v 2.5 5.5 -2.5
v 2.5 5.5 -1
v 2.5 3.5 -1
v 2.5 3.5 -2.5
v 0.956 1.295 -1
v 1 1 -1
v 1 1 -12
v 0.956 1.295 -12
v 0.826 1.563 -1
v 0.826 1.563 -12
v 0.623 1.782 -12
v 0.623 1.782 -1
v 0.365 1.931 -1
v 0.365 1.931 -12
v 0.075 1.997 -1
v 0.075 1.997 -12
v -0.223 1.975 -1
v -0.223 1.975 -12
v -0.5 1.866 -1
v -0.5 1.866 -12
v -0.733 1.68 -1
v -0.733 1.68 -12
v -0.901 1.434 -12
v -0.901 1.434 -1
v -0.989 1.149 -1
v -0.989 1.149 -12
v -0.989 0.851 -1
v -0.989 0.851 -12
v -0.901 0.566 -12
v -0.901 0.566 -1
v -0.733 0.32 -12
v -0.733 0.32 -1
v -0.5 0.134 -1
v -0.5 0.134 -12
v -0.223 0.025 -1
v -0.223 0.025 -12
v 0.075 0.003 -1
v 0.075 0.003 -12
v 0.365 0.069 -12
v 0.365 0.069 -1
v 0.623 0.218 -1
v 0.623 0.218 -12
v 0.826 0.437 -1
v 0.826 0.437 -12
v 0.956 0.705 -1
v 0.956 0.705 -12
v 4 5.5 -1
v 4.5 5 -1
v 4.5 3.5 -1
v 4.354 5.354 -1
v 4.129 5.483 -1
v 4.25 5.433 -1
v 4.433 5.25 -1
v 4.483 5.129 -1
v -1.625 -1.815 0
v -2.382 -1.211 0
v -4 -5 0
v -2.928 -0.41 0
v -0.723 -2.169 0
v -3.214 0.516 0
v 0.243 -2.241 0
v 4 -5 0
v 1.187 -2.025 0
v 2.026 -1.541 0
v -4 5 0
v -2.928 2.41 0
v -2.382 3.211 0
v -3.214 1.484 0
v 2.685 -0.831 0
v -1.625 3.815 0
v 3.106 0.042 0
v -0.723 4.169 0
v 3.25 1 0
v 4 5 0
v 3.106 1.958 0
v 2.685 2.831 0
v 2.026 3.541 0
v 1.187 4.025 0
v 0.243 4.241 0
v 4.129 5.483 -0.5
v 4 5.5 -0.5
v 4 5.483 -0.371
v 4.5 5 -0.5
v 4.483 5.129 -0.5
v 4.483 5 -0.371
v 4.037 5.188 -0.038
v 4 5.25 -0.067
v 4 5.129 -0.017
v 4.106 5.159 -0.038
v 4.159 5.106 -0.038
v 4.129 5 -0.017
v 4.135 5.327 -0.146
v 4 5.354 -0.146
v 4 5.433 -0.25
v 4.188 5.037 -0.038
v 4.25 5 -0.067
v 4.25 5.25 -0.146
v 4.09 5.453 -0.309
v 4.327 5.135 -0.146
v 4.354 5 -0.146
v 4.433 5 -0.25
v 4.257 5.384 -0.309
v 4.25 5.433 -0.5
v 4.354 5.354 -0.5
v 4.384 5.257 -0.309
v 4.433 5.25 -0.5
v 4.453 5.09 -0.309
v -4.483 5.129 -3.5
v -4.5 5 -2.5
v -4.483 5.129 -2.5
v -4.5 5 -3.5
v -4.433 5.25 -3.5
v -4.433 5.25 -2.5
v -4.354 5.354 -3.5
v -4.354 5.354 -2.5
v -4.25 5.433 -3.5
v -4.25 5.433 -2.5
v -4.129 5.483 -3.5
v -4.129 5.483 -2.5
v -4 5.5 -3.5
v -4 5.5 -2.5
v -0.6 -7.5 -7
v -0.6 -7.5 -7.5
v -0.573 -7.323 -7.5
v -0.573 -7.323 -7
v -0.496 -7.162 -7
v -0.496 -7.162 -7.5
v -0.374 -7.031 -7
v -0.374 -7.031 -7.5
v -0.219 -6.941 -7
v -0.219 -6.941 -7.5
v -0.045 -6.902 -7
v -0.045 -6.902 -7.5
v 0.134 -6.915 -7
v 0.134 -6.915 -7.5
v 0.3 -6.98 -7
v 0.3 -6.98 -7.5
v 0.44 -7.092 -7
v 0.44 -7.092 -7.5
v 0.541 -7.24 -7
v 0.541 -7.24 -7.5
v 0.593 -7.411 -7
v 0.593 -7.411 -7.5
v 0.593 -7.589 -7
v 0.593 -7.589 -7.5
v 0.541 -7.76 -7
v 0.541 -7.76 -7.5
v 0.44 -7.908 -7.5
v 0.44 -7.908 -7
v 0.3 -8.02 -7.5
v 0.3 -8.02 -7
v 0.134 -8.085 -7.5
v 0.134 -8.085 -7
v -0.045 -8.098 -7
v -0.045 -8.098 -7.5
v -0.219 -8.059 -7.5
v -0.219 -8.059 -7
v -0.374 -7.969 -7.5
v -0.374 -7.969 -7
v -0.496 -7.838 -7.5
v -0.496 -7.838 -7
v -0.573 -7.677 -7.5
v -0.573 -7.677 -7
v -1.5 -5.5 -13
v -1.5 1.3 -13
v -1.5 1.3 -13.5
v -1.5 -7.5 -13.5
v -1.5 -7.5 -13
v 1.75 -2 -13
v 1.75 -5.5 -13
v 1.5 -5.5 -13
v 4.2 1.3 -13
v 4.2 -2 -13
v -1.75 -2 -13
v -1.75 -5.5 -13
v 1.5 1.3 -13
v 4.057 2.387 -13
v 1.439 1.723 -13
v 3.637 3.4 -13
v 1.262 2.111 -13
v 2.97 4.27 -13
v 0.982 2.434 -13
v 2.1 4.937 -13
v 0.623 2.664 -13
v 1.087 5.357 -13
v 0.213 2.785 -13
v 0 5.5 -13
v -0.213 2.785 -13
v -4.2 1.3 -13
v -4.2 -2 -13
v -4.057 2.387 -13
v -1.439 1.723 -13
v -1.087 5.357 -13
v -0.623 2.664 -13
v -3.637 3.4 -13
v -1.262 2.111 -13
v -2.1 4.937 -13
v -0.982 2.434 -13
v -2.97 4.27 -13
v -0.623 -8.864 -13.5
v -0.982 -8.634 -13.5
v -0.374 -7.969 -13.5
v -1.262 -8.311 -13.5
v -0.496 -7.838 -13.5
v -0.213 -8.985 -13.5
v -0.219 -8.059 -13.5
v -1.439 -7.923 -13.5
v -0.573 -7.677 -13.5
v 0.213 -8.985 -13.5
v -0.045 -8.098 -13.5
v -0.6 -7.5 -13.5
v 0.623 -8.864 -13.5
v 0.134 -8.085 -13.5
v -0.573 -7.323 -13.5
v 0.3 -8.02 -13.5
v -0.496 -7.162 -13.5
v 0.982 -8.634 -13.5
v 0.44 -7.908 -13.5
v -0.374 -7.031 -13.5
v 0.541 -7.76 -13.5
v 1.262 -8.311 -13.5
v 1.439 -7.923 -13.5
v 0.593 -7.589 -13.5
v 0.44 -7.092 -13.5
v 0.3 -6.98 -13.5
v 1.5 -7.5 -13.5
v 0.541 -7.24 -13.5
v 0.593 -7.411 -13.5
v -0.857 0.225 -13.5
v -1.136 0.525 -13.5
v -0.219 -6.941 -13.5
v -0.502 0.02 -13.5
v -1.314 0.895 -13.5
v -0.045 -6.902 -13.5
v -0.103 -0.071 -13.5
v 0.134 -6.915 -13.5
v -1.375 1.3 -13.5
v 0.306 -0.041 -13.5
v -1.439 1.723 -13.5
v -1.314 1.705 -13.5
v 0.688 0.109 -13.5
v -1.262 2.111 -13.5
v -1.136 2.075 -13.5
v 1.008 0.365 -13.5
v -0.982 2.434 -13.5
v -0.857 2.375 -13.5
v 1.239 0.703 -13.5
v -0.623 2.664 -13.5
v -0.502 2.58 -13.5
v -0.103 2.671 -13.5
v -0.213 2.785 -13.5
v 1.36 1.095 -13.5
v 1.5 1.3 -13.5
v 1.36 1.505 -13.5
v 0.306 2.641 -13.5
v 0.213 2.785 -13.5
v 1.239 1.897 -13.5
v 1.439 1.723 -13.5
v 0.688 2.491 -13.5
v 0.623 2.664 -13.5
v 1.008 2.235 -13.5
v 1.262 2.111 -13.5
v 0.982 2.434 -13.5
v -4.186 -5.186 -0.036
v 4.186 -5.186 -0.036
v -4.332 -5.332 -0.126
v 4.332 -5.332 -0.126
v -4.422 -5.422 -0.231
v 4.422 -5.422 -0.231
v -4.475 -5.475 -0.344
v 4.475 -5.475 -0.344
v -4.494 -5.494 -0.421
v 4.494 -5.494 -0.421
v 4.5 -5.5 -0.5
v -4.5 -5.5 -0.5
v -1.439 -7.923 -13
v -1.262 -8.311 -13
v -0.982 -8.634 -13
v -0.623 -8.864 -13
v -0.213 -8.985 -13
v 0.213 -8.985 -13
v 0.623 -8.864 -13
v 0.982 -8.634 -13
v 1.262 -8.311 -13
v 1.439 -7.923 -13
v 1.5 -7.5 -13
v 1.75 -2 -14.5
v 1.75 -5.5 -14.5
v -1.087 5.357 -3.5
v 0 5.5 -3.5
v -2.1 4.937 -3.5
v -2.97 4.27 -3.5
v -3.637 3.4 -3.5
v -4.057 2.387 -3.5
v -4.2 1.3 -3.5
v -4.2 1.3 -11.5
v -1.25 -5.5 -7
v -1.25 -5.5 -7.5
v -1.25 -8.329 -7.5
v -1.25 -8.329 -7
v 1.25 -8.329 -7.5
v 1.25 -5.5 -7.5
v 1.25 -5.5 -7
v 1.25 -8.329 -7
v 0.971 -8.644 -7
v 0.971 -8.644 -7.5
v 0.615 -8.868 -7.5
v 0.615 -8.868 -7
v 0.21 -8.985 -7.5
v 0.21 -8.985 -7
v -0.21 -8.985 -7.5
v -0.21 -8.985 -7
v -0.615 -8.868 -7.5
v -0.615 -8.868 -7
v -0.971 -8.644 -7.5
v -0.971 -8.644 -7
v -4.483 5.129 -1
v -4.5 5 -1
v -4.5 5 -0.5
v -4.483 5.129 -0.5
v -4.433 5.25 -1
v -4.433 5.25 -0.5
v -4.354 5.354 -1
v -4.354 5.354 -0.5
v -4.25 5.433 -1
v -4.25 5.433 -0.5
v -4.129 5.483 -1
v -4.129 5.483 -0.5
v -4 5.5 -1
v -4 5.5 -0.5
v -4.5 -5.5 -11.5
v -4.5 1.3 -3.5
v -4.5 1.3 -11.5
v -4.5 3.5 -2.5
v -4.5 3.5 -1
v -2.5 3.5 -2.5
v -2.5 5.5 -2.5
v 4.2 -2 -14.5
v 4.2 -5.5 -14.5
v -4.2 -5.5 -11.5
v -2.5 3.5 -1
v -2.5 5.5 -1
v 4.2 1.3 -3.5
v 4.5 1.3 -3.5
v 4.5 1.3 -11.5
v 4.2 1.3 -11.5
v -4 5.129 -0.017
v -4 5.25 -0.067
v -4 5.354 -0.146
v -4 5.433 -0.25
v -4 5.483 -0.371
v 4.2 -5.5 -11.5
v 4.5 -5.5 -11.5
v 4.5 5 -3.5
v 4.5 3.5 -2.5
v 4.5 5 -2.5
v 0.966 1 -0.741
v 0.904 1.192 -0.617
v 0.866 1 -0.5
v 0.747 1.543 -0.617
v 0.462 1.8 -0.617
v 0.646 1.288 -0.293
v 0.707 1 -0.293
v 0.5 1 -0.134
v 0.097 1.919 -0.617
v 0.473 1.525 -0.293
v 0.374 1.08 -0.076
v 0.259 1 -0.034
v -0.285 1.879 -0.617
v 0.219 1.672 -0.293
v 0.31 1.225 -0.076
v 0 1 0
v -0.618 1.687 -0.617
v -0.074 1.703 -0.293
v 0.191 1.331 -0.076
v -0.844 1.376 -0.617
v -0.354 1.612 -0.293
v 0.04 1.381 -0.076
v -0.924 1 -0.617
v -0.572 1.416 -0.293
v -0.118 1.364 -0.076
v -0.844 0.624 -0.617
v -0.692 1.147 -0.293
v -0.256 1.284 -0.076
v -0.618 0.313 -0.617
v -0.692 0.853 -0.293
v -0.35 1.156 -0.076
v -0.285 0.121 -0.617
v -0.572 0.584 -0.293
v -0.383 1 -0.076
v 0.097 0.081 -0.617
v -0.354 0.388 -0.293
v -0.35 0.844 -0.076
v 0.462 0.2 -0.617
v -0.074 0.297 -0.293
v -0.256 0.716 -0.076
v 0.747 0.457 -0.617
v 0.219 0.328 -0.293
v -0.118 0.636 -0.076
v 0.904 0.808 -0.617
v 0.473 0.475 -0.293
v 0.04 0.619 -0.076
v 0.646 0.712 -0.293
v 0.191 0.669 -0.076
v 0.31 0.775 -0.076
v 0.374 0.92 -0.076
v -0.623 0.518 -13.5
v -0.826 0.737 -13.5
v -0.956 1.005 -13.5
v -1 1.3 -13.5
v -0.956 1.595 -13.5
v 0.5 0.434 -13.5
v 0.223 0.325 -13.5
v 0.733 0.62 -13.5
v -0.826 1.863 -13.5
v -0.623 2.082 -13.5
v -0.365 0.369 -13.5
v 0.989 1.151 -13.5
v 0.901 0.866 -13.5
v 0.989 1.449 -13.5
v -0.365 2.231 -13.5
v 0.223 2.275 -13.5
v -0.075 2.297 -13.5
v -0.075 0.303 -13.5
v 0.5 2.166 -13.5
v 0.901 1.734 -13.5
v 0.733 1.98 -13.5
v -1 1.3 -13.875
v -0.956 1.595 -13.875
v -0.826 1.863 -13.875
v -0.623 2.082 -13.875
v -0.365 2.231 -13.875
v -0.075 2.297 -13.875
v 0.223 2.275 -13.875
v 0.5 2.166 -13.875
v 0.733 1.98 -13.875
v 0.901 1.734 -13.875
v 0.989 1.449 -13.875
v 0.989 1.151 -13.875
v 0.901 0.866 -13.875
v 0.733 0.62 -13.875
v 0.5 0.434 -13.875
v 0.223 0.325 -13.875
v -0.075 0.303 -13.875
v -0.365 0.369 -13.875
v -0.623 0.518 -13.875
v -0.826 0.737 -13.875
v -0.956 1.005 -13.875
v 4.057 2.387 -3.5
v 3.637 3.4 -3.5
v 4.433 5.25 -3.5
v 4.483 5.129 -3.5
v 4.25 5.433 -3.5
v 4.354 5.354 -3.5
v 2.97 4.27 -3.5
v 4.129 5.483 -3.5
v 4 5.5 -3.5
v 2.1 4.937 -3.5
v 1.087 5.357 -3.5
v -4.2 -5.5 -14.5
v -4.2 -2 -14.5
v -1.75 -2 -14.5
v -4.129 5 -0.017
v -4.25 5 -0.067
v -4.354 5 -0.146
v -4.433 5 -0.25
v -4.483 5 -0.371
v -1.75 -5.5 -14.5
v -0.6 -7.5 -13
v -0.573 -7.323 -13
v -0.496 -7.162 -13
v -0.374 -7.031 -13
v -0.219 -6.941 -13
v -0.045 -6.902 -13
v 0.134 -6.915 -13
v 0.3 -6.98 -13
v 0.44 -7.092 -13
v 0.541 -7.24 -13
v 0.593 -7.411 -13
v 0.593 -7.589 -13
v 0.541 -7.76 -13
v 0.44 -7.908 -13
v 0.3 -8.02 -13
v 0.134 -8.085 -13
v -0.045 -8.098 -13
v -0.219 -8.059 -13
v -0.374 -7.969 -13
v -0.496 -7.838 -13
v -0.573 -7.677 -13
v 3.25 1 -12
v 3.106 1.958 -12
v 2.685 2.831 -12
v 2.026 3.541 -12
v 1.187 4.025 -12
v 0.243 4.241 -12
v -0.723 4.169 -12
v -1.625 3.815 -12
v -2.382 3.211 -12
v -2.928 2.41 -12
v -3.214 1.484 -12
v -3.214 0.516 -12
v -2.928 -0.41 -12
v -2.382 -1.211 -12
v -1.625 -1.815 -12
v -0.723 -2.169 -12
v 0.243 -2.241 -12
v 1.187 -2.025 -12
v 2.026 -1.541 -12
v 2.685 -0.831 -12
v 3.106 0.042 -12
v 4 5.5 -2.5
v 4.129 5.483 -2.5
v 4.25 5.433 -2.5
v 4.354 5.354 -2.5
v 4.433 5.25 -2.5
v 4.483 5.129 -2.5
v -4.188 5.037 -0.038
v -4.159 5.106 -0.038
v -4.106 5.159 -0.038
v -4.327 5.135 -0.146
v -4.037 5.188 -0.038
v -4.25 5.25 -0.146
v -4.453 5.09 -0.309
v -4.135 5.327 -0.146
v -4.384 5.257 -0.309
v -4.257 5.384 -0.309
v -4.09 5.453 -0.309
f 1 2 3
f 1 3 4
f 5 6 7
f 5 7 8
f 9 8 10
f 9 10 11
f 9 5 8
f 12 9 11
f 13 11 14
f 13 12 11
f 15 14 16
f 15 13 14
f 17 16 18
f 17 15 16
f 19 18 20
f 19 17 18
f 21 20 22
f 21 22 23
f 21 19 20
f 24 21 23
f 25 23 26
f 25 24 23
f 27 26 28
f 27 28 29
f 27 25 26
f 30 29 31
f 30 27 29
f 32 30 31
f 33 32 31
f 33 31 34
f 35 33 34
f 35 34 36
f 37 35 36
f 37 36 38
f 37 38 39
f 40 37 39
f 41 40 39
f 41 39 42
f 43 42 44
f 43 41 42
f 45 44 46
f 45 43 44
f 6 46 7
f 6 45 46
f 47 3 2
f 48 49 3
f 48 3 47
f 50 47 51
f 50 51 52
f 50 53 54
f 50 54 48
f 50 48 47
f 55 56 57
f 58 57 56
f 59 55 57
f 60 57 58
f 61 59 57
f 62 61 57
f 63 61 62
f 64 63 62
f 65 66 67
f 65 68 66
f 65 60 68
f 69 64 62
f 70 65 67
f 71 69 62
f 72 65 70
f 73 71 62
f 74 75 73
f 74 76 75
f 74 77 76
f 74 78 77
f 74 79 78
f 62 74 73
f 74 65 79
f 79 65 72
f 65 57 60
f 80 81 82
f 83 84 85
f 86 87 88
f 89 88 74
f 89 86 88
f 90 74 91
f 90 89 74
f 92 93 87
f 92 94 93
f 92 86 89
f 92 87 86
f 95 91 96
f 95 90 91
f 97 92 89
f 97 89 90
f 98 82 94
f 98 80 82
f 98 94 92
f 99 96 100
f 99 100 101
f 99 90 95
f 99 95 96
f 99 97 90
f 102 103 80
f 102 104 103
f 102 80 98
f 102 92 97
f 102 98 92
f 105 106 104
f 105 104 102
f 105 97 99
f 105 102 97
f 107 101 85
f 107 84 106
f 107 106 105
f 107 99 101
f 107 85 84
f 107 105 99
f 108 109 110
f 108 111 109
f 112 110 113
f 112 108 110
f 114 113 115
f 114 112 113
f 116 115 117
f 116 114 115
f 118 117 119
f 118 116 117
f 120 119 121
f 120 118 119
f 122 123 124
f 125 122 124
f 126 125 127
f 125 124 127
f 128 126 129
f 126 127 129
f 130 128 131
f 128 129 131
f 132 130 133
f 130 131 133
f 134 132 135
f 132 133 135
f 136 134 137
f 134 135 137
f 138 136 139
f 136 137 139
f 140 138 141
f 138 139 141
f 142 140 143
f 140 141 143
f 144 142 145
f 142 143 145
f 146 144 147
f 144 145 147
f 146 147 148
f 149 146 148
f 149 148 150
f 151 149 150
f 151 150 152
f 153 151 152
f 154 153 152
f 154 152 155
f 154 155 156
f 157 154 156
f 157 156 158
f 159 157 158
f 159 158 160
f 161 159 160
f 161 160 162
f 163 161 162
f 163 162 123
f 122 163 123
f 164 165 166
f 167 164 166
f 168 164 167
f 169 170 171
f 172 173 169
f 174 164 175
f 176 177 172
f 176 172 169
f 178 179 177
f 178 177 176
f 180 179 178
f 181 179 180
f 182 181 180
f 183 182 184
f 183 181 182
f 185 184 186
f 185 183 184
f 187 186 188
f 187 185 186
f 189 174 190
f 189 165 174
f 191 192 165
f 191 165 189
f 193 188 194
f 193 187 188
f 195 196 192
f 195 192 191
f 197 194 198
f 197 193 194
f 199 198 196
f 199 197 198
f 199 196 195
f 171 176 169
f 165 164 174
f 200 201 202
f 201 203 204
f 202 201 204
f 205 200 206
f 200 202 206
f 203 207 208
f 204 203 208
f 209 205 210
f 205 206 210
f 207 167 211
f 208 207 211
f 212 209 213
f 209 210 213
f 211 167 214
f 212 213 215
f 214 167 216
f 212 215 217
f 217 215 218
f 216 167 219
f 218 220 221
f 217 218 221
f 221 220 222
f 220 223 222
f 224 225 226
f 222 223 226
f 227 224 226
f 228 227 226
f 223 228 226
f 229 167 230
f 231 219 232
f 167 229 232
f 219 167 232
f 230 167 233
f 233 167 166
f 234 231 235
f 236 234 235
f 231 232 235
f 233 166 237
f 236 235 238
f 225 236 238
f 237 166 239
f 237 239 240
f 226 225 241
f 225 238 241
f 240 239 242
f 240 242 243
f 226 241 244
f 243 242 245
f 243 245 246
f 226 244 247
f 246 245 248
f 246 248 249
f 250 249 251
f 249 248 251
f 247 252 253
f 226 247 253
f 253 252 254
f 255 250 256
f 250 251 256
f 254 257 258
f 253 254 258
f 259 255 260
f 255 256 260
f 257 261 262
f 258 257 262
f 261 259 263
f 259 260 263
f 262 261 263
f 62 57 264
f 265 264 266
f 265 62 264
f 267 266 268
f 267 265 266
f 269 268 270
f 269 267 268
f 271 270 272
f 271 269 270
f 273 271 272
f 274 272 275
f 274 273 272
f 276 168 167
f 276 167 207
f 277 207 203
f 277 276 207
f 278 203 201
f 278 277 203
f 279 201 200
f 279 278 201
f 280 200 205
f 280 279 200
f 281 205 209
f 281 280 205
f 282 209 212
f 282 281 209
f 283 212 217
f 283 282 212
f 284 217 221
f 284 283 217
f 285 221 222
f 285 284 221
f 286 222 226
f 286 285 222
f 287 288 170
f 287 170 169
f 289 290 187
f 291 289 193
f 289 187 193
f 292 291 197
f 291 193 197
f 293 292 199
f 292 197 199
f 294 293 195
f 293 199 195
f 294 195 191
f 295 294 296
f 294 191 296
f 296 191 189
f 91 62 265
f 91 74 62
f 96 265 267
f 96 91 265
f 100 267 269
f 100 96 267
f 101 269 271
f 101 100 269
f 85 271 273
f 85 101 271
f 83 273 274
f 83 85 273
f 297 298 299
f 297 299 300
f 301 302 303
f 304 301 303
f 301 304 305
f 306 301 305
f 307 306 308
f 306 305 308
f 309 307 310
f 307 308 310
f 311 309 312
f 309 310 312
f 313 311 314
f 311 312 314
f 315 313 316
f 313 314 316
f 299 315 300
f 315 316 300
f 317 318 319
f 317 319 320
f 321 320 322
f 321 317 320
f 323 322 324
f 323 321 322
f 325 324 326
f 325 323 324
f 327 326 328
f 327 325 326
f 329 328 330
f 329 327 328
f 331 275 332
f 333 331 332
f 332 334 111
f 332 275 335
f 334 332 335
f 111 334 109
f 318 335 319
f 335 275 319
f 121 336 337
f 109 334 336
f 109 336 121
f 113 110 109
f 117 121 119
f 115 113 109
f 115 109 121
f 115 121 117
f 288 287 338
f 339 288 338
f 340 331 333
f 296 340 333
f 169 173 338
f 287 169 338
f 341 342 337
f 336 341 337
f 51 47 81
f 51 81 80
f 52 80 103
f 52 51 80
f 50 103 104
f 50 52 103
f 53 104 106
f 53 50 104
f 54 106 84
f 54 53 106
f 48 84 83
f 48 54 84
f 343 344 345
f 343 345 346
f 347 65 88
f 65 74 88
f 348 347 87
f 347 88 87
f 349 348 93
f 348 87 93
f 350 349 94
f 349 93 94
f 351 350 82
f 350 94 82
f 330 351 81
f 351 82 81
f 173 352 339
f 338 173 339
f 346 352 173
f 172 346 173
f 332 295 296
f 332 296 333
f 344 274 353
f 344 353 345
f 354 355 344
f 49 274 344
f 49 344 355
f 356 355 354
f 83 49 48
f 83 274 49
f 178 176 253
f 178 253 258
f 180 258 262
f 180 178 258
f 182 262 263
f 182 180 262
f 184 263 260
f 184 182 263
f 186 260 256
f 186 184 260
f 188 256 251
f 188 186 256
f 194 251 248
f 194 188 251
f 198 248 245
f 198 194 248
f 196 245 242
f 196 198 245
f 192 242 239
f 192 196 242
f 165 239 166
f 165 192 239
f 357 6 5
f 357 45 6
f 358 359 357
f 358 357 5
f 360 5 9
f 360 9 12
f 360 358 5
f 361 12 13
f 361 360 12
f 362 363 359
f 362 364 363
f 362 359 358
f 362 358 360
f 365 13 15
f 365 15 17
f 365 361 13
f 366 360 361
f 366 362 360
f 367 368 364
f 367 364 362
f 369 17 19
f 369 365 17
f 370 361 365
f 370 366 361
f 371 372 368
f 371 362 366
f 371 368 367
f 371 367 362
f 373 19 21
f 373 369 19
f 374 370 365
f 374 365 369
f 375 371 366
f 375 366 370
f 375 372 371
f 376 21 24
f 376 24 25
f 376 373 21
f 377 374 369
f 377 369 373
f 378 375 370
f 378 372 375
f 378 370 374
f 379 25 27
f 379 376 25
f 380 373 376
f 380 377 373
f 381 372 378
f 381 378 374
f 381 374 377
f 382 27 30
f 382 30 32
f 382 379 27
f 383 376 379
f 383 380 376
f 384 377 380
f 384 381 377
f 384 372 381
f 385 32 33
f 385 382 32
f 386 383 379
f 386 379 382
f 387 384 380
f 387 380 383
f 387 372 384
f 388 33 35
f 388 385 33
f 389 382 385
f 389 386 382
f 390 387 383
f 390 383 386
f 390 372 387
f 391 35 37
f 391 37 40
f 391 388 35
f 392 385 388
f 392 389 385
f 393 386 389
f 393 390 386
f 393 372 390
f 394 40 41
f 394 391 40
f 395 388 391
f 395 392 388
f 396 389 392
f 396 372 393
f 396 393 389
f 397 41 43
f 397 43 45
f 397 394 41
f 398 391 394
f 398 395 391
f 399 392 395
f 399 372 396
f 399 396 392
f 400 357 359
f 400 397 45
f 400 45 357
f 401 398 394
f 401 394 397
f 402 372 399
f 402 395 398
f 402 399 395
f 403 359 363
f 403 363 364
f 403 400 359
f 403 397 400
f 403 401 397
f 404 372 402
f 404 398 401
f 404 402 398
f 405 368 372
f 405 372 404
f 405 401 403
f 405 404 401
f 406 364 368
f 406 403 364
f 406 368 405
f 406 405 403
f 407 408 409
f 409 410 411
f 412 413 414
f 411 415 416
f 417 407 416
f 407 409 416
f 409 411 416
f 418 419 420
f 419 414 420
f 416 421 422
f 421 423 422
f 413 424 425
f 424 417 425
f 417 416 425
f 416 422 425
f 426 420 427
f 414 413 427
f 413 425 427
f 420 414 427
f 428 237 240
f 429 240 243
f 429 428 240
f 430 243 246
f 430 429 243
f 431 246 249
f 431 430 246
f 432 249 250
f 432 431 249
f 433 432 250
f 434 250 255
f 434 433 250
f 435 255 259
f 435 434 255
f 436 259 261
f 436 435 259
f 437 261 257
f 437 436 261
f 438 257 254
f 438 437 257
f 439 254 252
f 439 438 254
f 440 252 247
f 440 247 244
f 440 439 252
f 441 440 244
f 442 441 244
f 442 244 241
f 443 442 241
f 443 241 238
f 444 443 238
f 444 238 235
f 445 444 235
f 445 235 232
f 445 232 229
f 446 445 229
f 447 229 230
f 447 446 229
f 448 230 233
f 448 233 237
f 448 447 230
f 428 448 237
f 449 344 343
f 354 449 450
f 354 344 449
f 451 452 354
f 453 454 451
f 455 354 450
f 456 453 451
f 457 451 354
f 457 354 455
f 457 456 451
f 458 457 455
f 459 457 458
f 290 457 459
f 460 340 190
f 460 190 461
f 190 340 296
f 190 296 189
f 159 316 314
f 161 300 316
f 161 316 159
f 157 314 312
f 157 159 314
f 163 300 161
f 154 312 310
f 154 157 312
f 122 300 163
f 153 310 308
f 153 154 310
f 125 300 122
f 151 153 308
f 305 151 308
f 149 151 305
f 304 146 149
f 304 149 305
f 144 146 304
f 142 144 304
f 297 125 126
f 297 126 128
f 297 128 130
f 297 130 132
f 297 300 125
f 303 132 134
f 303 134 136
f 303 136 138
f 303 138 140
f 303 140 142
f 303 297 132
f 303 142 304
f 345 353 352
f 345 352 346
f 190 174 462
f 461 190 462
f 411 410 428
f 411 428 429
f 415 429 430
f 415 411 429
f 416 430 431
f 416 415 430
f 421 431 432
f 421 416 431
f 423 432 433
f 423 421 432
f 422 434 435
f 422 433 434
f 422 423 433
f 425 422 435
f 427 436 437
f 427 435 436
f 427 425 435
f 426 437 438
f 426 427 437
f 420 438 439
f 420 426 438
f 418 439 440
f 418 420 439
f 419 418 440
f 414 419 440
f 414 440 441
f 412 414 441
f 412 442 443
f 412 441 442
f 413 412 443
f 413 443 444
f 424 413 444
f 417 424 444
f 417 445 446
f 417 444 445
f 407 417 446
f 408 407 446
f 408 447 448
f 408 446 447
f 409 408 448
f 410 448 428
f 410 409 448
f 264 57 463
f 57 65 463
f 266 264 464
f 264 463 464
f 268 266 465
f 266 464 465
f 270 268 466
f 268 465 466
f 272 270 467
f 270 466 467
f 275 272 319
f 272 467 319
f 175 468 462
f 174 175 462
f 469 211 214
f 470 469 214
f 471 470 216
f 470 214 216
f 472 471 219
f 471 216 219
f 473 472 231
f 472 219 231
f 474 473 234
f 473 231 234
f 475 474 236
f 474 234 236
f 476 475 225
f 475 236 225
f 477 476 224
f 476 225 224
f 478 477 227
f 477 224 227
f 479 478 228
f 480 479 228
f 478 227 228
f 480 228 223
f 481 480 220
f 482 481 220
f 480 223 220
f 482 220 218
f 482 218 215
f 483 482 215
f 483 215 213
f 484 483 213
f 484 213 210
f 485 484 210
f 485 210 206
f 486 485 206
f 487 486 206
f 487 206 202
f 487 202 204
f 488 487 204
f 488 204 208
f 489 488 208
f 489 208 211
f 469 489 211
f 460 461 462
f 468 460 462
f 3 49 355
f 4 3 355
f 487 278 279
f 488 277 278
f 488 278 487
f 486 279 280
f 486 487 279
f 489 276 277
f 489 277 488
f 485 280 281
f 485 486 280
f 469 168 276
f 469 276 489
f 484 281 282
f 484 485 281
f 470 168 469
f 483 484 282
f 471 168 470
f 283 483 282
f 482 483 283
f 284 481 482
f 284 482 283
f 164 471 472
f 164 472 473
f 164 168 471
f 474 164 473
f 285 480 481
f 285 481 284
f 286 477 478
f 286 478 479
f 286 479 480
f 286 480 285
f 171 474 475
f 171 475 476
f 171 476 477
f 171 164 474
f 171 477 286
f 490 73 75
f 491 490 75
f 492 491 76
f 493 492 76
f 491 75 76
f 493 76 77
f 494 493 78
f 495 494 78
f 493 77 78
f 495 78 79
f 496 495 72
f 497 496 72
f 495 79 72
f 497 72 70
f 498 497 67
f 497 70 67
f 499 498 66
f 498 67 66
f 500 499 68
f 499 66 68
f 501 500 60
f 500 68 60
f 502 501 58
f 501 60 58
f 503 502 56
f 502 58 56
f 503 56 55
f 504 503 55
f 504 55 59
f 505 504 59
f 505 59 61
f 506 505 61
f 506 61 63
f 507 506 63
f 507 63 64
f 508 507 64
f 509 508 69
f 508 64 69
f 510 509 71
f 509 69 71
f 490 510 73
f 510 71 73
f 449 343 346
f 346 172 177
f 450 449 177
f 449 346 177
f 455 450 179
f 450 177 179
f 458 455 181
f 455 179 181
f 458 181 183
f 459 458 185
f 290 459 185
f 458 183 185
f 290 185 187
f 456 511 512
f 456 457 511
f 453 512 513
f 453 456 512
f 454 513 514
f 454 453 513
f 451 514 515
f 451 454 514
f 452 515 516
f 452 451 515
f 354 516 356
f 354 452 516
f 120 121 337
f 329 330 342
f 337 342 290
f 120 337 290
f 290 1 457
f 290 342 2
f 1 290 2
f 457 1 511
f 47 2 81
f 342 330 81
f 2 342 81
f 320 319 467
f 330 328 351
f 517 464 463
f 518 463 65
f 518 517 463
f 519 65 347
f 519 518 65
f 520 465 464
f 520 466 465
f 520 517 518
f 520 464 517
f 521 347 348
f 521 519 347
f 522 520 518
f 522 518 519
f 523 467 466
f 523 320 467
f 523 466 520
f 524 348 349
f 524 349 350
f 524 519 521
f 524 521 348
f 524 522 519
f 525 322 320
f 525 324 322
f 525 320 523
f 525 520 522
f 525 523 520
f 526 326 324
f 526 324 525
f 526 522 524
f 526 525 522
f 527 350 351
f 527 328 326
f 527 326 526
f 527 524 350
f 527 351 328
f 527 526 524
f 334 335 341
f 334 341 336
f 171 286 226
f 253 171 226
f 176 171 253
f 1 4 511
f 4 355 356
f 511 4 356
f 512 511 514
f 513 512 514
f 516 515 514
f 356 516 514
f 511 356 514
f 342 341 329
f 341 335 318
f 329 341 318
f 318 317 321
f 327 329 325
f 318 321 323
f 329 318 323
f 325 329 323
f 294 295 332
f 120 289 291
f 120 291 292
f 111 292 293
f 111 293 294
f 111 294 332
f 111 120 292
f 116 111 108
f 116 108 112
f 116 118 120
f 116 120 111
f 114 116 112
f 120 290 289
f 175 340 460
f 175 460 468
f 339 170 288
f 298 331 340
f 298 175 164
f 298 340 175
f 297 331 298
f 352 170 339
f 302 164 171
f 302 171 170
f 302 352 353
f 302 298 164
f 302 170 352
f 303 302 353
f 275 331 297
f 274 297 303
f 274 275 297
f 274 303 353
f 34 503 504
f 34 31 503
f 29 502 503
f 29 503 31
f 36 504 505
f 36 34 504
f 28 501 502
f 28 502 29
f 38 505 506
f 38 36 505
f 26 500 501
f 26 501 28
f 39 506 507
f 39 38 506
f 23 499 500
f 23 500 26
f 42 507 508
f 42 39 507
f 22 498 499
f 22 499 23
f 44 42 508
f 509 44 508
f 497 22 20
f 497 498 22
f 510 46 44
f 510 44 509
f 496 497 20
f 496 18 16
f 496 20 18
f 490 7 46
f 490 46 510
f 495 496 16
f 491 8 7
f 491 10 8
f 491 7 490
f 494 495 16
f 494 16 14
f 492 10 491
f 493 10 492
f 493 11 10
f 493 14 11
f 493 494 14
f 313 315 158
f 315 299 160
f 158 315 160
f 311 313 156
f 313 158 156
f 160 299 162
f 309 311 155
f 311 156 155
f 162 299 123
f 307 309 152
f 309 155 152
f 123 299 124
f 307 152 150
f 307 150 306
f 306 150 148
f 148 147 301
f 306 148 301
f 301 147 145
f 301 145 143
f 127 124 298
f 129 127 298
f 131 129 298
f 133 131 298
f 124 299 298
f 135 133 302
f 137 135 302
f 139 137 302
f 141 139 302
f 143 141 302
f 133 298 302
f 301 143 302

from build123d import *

# Parameters (mm, degrees)
SKETCH1_W           = 9
SKETCH1_H           = 11
BOSS_EXTRUDE1_DEPTH = 14.5
CUT_EXTRUDE3_DEPTH  = 11
SKETCH3_W           = 3
SKETCH3_H           = 6.8
CUT_EXTRUDE4_DEPTH  = 0.3
SKETCH5_W           = 1.5
SKETCH5_H           = 7.5
CUT_EXTRUDE5_DEPTH  = 18.781732199
SKETCH6_W           = 3.5
SKETCH6_H           = 3.5
CUT_EXTRUDE6_DEPTH  = 1.5
BOSS_EXTRUDE2_DEPTH = 0.5
SKETCH8_R           = 1.375
SKETCH8_R_2         = 1
BOSS_EXTRUDE3_DEPTH = 0.5
CHAMFER1_SIZE       = 0.5
SKETCH9_W           = 2.5
SKETCH9_H           = 0.5
BOSS_EXTRUDE4_DEPTH = 6
CUT_EXTRUDE8_DEPTH  = 0.5
SKETCH11_R          = 0.6
CUT_EXTRUDE9_DEPTH  = 17.83745824
SKETCH12_W          = 1.5
SKETCH12_H          = 2
CUT_EXTRUDE10_DEPTH = 2
SKETCH13_R          = 3.25
SKETCH13_R_2        = 1
CUT_EXTRUDE11_DEPTH = 12
FILLET1_R           = 1
FILLET2_R           = 0.5


with BuildPart() as part:
    # Sketch1 → Boss-Extrude1 (new body)
    with BuildSketch(Plane.XY):
        Rectangle(SKETCH1_W, SKETCH1_H)
    extrude(amount=-BOSS_EXTRUDE1_DEPTH)

    # Sketch2 → Cut-Extrude3 (cut)
    with BuildSketch(Plane(origin=(0, 0, -14.5), x_dir=(-1, 0, 0), z_dir=(0, 0, -1))):
        with BuildLine():
            Line((-4.5, 1.3), (-4.2, 1.3))
            ThreePointArc((-4.2, 1.3), (-2.969848481, 4.269848481), (0, 5.5))
            Line((0, 5.5), (-4.5, 5.5))
            Line((-4.5, 5.5), (-4.5, 1.3))
        make_face()
        with BuildLine():
            ThreePointArc((0, 5.5), (2.969848481, 4.269848481), (4.2, 1.3))
            Line((4.2, 1.3), (4.5, 1.3))
            Line((4.5, 1.3), (4.5, 5.5))
            Line((4.5, 5.5), (0, 5.5))
        make_face()
    extrude(amount=-CUT_EXTRUDE3_DEPTH, mode=Mode.SUBTRACT)

    # Sketch3 → Cut-Extrude4 (cut)
    with BuildSketch(Plane(origin=(4.5, 0, 0), x_dir=(0, 0, -1), z_dir=(1, 0, 0))):
        with Locations((13, -2.1)):
            Rectangle(SKETCH3_W, SKETCH3_H)
    cut_extrude4 = extrude(amount=-CUT_EXTRUDE4_DEPTH, mode=Mode.SUBTRACT)

    # Mirror1: Cut-Extrude4 across plane
    add(cut_extrude4.mirror(Plane(origin=(0, 0, 0), x_dir=(0, 0, 1), z_dir=(1, 0, 0))), mode=Mode.SUBTRACT)

    # Sketch5 → Cut-Extrude5 (cut, through all)
    with BuildSketch(Plane(origin=(4.2, 0, 0), x_dir=(0, 0, -1), z_dir=(1, 0, 0))):
        with Locations((13.75, 1.75)):
            Rectangle(SKETCH5_W, SKETCH5_H)
    extrude(amount=-CUT_EXTRUDE5_DEPTH, mode=Mode.SUBTRACT)

    # Sketch6 → Cut-Extrude6 (cut)
    with BuildSketch(Plane(origin=(0, 0, -14.5), x_dir=(-1, 0, 0), z_dir=(0, 0, -1))):
        with Locations((0, -3.75)):
            Rectangle(SKETCH6_W, SKETCH6_H)
    extrude(amount=-CUT_EXTRUDE6_DEPTH, mode=Mode.SUBTRACT)

    # Sketch7 → Boss-Extrude2 (add)
    with BuildSketch(Plane(origin=(0, 0, -13), x_dir=(-1, 0, 0), z_dir=(0, 0, -1))):
        with BuildLine():
            Line((1.5, 1.3), (1.5, -7.5))
            ThreePointArc((1.5, -7.5), (0, -9), (-1.5, -7.5))
            Line((-1.5, -7.5), (-1.5, 1.3))
            ThreePointArc((-1.5, 1.3), (0, 2.8), (1.5, 1.3))
        make_face()
    extrude(amount=BOSS_EXTRUDE2_DEPTH)

    # Sketch8 → Boss-Extrude3 (add)
    with BuildSketch(Plane(origin=(0, 0, -13.5), x_dir=(-1, 0, 0), z_dir=(0, 0, -1))):
        with Locations((0, 1.3)):
            Circle(SKETCH8_R)
        with Locations((0, 1.3)):
            Circle(SKETCH8_R_2, mode=Mode.SUBTRACT)
    extrude(amount=BOSS_EXTRUDE3_DEPTH)

    # Chamfer1
    # the kernel refuses this chamfer: 0.5 mm, written as the material it takes off along each edge
    with BuildSketch(Plane(origin=(0, 1.3, -14), x_dir=(-1, 0, 0), z_dir=(0, -1, 0))) as chamfer1_piece_1_section:
        Polygon((1.375, -CHAMFER1_SIZE), (1.375 - CHAMFER1_SIZE, 0), (1.375, 0), align=None)
    chamfer1_piece_1 = revolve(axis=Axis((0, 1.3, -14), (0, 0, -1)), mode=Mode.PRIVATE)
    chamfer1_piece_1 = split(chamfer1_piece_1, bisect_by=Plane(origin=(1.125101861, 1.3, -13.5), z_dir=(0, 0, -1)), keep=Keep.TOP, mode=Mode.PRIVATE)
    add(chamfer1_piece_1, mode=Mode.SUBTRACT)

    # Sketch9 → Boss-Extrude4 (add)
    with BuildSketch(Plane.XZ.offset(5.5)):
        with Locations((0, -7.25)):
            Rectangle(SKETCH9_W, SKETCH9_H)
    extrude(amount=BOSS_EXTRUDE4_DEPTH)

    # Sketch10 → Cut-Extrude8 (cut)
    with BuildSketch(Plane.XY.offset(-7)):
        with BuildLine():
            ThreePointArc((1.25, -8.329156198), (0, -9), (-1.25, -8.329156198))
            Line((-1.25, -8.329156198), (-1.25, -11.5))
            Line((-1.25, -11.5), (1.25, -11.5))
            Line((1.25, -11.5), (1.25, -8.329156198))
        make_face()
    extrude(amount=-CUT_EXTRUDE8_DEPTH, mode=Mode.SUBTRACT)

    # Sketch11 → Cut-Extrude9 (cut, through all)
    with BuildSketch(Plane(origin=(0, 0, -13.5), x_dir=(-1, 0, 0), z_dir=(0, 0, -1))):
        with Locations((0, -7.5)):
            Circle(SKETCH11_R)
    extrude(amount=-CUT_EXTRUDE9_DEPTH, mode=Mode.SUBTRACT)

    # Sketch12 → Cut-Extrude10 (cut)
    with BuildSketch(Plane(origin=(4.5, 0, 0), x_dir=(0, 0, -1), z_dir=(1, 0, 0))):
        with Locations((1.75, 4.5)):
            Rectangle(SKETCH12_W, SKETCH12_H)
    cut_extrude10 = extrude(amount=-CUT_EXTRUDE10_DEPTH, mode=Mode.SUBTRACT)

    # Mirror2: Cut-Extrude10 across plane
    add(cut_extrude10.mirror(Plane(origin=(0, 0, 0), x_dir=(0, 0, 1), z_dir=(1, 0, 0))), mode=Mode.SUBTRACT)

    # Sketch13 → Cut-Extrude11 (cut)
    with BuildSketch(Plane.XY):
        with Locations((0, 1)):
            Circle(SKETCH13_R)
        with Locations((0, 1)):
            Circle(SKETCH13_R_2, mode=Mode.SUBTRACT)
    extrude(amount=-CUT_EXTRUDE11_DEPTH, mode=Mode.SUBTRACT)

    # Fillet1
    fillet1_edges = [part.edges().sort_by_distance(p)[0] for p in [
        (-1, 1, 0),
    ]]
    fillet(fillet1_edges, radius=FILLET1_R)

    # Fillet2
    fillet2_edges = [part.edges().sort_by_distance(p)[0] for p in [
        (4.5, 5.5, -3),
        (4.5, 5.5, -0.5),
        (-4.5, 5.5, -0.5),
        (-4.5, 5.5, -3),
        (0, -5.5, 0),
        (-4.5, 0, 0),
        (0, 5.5, 0),
        (4.5, 0, 0),
    ]]
    fillet(fillet2_edges, radius=FILLET2_R)


solid = part.part
